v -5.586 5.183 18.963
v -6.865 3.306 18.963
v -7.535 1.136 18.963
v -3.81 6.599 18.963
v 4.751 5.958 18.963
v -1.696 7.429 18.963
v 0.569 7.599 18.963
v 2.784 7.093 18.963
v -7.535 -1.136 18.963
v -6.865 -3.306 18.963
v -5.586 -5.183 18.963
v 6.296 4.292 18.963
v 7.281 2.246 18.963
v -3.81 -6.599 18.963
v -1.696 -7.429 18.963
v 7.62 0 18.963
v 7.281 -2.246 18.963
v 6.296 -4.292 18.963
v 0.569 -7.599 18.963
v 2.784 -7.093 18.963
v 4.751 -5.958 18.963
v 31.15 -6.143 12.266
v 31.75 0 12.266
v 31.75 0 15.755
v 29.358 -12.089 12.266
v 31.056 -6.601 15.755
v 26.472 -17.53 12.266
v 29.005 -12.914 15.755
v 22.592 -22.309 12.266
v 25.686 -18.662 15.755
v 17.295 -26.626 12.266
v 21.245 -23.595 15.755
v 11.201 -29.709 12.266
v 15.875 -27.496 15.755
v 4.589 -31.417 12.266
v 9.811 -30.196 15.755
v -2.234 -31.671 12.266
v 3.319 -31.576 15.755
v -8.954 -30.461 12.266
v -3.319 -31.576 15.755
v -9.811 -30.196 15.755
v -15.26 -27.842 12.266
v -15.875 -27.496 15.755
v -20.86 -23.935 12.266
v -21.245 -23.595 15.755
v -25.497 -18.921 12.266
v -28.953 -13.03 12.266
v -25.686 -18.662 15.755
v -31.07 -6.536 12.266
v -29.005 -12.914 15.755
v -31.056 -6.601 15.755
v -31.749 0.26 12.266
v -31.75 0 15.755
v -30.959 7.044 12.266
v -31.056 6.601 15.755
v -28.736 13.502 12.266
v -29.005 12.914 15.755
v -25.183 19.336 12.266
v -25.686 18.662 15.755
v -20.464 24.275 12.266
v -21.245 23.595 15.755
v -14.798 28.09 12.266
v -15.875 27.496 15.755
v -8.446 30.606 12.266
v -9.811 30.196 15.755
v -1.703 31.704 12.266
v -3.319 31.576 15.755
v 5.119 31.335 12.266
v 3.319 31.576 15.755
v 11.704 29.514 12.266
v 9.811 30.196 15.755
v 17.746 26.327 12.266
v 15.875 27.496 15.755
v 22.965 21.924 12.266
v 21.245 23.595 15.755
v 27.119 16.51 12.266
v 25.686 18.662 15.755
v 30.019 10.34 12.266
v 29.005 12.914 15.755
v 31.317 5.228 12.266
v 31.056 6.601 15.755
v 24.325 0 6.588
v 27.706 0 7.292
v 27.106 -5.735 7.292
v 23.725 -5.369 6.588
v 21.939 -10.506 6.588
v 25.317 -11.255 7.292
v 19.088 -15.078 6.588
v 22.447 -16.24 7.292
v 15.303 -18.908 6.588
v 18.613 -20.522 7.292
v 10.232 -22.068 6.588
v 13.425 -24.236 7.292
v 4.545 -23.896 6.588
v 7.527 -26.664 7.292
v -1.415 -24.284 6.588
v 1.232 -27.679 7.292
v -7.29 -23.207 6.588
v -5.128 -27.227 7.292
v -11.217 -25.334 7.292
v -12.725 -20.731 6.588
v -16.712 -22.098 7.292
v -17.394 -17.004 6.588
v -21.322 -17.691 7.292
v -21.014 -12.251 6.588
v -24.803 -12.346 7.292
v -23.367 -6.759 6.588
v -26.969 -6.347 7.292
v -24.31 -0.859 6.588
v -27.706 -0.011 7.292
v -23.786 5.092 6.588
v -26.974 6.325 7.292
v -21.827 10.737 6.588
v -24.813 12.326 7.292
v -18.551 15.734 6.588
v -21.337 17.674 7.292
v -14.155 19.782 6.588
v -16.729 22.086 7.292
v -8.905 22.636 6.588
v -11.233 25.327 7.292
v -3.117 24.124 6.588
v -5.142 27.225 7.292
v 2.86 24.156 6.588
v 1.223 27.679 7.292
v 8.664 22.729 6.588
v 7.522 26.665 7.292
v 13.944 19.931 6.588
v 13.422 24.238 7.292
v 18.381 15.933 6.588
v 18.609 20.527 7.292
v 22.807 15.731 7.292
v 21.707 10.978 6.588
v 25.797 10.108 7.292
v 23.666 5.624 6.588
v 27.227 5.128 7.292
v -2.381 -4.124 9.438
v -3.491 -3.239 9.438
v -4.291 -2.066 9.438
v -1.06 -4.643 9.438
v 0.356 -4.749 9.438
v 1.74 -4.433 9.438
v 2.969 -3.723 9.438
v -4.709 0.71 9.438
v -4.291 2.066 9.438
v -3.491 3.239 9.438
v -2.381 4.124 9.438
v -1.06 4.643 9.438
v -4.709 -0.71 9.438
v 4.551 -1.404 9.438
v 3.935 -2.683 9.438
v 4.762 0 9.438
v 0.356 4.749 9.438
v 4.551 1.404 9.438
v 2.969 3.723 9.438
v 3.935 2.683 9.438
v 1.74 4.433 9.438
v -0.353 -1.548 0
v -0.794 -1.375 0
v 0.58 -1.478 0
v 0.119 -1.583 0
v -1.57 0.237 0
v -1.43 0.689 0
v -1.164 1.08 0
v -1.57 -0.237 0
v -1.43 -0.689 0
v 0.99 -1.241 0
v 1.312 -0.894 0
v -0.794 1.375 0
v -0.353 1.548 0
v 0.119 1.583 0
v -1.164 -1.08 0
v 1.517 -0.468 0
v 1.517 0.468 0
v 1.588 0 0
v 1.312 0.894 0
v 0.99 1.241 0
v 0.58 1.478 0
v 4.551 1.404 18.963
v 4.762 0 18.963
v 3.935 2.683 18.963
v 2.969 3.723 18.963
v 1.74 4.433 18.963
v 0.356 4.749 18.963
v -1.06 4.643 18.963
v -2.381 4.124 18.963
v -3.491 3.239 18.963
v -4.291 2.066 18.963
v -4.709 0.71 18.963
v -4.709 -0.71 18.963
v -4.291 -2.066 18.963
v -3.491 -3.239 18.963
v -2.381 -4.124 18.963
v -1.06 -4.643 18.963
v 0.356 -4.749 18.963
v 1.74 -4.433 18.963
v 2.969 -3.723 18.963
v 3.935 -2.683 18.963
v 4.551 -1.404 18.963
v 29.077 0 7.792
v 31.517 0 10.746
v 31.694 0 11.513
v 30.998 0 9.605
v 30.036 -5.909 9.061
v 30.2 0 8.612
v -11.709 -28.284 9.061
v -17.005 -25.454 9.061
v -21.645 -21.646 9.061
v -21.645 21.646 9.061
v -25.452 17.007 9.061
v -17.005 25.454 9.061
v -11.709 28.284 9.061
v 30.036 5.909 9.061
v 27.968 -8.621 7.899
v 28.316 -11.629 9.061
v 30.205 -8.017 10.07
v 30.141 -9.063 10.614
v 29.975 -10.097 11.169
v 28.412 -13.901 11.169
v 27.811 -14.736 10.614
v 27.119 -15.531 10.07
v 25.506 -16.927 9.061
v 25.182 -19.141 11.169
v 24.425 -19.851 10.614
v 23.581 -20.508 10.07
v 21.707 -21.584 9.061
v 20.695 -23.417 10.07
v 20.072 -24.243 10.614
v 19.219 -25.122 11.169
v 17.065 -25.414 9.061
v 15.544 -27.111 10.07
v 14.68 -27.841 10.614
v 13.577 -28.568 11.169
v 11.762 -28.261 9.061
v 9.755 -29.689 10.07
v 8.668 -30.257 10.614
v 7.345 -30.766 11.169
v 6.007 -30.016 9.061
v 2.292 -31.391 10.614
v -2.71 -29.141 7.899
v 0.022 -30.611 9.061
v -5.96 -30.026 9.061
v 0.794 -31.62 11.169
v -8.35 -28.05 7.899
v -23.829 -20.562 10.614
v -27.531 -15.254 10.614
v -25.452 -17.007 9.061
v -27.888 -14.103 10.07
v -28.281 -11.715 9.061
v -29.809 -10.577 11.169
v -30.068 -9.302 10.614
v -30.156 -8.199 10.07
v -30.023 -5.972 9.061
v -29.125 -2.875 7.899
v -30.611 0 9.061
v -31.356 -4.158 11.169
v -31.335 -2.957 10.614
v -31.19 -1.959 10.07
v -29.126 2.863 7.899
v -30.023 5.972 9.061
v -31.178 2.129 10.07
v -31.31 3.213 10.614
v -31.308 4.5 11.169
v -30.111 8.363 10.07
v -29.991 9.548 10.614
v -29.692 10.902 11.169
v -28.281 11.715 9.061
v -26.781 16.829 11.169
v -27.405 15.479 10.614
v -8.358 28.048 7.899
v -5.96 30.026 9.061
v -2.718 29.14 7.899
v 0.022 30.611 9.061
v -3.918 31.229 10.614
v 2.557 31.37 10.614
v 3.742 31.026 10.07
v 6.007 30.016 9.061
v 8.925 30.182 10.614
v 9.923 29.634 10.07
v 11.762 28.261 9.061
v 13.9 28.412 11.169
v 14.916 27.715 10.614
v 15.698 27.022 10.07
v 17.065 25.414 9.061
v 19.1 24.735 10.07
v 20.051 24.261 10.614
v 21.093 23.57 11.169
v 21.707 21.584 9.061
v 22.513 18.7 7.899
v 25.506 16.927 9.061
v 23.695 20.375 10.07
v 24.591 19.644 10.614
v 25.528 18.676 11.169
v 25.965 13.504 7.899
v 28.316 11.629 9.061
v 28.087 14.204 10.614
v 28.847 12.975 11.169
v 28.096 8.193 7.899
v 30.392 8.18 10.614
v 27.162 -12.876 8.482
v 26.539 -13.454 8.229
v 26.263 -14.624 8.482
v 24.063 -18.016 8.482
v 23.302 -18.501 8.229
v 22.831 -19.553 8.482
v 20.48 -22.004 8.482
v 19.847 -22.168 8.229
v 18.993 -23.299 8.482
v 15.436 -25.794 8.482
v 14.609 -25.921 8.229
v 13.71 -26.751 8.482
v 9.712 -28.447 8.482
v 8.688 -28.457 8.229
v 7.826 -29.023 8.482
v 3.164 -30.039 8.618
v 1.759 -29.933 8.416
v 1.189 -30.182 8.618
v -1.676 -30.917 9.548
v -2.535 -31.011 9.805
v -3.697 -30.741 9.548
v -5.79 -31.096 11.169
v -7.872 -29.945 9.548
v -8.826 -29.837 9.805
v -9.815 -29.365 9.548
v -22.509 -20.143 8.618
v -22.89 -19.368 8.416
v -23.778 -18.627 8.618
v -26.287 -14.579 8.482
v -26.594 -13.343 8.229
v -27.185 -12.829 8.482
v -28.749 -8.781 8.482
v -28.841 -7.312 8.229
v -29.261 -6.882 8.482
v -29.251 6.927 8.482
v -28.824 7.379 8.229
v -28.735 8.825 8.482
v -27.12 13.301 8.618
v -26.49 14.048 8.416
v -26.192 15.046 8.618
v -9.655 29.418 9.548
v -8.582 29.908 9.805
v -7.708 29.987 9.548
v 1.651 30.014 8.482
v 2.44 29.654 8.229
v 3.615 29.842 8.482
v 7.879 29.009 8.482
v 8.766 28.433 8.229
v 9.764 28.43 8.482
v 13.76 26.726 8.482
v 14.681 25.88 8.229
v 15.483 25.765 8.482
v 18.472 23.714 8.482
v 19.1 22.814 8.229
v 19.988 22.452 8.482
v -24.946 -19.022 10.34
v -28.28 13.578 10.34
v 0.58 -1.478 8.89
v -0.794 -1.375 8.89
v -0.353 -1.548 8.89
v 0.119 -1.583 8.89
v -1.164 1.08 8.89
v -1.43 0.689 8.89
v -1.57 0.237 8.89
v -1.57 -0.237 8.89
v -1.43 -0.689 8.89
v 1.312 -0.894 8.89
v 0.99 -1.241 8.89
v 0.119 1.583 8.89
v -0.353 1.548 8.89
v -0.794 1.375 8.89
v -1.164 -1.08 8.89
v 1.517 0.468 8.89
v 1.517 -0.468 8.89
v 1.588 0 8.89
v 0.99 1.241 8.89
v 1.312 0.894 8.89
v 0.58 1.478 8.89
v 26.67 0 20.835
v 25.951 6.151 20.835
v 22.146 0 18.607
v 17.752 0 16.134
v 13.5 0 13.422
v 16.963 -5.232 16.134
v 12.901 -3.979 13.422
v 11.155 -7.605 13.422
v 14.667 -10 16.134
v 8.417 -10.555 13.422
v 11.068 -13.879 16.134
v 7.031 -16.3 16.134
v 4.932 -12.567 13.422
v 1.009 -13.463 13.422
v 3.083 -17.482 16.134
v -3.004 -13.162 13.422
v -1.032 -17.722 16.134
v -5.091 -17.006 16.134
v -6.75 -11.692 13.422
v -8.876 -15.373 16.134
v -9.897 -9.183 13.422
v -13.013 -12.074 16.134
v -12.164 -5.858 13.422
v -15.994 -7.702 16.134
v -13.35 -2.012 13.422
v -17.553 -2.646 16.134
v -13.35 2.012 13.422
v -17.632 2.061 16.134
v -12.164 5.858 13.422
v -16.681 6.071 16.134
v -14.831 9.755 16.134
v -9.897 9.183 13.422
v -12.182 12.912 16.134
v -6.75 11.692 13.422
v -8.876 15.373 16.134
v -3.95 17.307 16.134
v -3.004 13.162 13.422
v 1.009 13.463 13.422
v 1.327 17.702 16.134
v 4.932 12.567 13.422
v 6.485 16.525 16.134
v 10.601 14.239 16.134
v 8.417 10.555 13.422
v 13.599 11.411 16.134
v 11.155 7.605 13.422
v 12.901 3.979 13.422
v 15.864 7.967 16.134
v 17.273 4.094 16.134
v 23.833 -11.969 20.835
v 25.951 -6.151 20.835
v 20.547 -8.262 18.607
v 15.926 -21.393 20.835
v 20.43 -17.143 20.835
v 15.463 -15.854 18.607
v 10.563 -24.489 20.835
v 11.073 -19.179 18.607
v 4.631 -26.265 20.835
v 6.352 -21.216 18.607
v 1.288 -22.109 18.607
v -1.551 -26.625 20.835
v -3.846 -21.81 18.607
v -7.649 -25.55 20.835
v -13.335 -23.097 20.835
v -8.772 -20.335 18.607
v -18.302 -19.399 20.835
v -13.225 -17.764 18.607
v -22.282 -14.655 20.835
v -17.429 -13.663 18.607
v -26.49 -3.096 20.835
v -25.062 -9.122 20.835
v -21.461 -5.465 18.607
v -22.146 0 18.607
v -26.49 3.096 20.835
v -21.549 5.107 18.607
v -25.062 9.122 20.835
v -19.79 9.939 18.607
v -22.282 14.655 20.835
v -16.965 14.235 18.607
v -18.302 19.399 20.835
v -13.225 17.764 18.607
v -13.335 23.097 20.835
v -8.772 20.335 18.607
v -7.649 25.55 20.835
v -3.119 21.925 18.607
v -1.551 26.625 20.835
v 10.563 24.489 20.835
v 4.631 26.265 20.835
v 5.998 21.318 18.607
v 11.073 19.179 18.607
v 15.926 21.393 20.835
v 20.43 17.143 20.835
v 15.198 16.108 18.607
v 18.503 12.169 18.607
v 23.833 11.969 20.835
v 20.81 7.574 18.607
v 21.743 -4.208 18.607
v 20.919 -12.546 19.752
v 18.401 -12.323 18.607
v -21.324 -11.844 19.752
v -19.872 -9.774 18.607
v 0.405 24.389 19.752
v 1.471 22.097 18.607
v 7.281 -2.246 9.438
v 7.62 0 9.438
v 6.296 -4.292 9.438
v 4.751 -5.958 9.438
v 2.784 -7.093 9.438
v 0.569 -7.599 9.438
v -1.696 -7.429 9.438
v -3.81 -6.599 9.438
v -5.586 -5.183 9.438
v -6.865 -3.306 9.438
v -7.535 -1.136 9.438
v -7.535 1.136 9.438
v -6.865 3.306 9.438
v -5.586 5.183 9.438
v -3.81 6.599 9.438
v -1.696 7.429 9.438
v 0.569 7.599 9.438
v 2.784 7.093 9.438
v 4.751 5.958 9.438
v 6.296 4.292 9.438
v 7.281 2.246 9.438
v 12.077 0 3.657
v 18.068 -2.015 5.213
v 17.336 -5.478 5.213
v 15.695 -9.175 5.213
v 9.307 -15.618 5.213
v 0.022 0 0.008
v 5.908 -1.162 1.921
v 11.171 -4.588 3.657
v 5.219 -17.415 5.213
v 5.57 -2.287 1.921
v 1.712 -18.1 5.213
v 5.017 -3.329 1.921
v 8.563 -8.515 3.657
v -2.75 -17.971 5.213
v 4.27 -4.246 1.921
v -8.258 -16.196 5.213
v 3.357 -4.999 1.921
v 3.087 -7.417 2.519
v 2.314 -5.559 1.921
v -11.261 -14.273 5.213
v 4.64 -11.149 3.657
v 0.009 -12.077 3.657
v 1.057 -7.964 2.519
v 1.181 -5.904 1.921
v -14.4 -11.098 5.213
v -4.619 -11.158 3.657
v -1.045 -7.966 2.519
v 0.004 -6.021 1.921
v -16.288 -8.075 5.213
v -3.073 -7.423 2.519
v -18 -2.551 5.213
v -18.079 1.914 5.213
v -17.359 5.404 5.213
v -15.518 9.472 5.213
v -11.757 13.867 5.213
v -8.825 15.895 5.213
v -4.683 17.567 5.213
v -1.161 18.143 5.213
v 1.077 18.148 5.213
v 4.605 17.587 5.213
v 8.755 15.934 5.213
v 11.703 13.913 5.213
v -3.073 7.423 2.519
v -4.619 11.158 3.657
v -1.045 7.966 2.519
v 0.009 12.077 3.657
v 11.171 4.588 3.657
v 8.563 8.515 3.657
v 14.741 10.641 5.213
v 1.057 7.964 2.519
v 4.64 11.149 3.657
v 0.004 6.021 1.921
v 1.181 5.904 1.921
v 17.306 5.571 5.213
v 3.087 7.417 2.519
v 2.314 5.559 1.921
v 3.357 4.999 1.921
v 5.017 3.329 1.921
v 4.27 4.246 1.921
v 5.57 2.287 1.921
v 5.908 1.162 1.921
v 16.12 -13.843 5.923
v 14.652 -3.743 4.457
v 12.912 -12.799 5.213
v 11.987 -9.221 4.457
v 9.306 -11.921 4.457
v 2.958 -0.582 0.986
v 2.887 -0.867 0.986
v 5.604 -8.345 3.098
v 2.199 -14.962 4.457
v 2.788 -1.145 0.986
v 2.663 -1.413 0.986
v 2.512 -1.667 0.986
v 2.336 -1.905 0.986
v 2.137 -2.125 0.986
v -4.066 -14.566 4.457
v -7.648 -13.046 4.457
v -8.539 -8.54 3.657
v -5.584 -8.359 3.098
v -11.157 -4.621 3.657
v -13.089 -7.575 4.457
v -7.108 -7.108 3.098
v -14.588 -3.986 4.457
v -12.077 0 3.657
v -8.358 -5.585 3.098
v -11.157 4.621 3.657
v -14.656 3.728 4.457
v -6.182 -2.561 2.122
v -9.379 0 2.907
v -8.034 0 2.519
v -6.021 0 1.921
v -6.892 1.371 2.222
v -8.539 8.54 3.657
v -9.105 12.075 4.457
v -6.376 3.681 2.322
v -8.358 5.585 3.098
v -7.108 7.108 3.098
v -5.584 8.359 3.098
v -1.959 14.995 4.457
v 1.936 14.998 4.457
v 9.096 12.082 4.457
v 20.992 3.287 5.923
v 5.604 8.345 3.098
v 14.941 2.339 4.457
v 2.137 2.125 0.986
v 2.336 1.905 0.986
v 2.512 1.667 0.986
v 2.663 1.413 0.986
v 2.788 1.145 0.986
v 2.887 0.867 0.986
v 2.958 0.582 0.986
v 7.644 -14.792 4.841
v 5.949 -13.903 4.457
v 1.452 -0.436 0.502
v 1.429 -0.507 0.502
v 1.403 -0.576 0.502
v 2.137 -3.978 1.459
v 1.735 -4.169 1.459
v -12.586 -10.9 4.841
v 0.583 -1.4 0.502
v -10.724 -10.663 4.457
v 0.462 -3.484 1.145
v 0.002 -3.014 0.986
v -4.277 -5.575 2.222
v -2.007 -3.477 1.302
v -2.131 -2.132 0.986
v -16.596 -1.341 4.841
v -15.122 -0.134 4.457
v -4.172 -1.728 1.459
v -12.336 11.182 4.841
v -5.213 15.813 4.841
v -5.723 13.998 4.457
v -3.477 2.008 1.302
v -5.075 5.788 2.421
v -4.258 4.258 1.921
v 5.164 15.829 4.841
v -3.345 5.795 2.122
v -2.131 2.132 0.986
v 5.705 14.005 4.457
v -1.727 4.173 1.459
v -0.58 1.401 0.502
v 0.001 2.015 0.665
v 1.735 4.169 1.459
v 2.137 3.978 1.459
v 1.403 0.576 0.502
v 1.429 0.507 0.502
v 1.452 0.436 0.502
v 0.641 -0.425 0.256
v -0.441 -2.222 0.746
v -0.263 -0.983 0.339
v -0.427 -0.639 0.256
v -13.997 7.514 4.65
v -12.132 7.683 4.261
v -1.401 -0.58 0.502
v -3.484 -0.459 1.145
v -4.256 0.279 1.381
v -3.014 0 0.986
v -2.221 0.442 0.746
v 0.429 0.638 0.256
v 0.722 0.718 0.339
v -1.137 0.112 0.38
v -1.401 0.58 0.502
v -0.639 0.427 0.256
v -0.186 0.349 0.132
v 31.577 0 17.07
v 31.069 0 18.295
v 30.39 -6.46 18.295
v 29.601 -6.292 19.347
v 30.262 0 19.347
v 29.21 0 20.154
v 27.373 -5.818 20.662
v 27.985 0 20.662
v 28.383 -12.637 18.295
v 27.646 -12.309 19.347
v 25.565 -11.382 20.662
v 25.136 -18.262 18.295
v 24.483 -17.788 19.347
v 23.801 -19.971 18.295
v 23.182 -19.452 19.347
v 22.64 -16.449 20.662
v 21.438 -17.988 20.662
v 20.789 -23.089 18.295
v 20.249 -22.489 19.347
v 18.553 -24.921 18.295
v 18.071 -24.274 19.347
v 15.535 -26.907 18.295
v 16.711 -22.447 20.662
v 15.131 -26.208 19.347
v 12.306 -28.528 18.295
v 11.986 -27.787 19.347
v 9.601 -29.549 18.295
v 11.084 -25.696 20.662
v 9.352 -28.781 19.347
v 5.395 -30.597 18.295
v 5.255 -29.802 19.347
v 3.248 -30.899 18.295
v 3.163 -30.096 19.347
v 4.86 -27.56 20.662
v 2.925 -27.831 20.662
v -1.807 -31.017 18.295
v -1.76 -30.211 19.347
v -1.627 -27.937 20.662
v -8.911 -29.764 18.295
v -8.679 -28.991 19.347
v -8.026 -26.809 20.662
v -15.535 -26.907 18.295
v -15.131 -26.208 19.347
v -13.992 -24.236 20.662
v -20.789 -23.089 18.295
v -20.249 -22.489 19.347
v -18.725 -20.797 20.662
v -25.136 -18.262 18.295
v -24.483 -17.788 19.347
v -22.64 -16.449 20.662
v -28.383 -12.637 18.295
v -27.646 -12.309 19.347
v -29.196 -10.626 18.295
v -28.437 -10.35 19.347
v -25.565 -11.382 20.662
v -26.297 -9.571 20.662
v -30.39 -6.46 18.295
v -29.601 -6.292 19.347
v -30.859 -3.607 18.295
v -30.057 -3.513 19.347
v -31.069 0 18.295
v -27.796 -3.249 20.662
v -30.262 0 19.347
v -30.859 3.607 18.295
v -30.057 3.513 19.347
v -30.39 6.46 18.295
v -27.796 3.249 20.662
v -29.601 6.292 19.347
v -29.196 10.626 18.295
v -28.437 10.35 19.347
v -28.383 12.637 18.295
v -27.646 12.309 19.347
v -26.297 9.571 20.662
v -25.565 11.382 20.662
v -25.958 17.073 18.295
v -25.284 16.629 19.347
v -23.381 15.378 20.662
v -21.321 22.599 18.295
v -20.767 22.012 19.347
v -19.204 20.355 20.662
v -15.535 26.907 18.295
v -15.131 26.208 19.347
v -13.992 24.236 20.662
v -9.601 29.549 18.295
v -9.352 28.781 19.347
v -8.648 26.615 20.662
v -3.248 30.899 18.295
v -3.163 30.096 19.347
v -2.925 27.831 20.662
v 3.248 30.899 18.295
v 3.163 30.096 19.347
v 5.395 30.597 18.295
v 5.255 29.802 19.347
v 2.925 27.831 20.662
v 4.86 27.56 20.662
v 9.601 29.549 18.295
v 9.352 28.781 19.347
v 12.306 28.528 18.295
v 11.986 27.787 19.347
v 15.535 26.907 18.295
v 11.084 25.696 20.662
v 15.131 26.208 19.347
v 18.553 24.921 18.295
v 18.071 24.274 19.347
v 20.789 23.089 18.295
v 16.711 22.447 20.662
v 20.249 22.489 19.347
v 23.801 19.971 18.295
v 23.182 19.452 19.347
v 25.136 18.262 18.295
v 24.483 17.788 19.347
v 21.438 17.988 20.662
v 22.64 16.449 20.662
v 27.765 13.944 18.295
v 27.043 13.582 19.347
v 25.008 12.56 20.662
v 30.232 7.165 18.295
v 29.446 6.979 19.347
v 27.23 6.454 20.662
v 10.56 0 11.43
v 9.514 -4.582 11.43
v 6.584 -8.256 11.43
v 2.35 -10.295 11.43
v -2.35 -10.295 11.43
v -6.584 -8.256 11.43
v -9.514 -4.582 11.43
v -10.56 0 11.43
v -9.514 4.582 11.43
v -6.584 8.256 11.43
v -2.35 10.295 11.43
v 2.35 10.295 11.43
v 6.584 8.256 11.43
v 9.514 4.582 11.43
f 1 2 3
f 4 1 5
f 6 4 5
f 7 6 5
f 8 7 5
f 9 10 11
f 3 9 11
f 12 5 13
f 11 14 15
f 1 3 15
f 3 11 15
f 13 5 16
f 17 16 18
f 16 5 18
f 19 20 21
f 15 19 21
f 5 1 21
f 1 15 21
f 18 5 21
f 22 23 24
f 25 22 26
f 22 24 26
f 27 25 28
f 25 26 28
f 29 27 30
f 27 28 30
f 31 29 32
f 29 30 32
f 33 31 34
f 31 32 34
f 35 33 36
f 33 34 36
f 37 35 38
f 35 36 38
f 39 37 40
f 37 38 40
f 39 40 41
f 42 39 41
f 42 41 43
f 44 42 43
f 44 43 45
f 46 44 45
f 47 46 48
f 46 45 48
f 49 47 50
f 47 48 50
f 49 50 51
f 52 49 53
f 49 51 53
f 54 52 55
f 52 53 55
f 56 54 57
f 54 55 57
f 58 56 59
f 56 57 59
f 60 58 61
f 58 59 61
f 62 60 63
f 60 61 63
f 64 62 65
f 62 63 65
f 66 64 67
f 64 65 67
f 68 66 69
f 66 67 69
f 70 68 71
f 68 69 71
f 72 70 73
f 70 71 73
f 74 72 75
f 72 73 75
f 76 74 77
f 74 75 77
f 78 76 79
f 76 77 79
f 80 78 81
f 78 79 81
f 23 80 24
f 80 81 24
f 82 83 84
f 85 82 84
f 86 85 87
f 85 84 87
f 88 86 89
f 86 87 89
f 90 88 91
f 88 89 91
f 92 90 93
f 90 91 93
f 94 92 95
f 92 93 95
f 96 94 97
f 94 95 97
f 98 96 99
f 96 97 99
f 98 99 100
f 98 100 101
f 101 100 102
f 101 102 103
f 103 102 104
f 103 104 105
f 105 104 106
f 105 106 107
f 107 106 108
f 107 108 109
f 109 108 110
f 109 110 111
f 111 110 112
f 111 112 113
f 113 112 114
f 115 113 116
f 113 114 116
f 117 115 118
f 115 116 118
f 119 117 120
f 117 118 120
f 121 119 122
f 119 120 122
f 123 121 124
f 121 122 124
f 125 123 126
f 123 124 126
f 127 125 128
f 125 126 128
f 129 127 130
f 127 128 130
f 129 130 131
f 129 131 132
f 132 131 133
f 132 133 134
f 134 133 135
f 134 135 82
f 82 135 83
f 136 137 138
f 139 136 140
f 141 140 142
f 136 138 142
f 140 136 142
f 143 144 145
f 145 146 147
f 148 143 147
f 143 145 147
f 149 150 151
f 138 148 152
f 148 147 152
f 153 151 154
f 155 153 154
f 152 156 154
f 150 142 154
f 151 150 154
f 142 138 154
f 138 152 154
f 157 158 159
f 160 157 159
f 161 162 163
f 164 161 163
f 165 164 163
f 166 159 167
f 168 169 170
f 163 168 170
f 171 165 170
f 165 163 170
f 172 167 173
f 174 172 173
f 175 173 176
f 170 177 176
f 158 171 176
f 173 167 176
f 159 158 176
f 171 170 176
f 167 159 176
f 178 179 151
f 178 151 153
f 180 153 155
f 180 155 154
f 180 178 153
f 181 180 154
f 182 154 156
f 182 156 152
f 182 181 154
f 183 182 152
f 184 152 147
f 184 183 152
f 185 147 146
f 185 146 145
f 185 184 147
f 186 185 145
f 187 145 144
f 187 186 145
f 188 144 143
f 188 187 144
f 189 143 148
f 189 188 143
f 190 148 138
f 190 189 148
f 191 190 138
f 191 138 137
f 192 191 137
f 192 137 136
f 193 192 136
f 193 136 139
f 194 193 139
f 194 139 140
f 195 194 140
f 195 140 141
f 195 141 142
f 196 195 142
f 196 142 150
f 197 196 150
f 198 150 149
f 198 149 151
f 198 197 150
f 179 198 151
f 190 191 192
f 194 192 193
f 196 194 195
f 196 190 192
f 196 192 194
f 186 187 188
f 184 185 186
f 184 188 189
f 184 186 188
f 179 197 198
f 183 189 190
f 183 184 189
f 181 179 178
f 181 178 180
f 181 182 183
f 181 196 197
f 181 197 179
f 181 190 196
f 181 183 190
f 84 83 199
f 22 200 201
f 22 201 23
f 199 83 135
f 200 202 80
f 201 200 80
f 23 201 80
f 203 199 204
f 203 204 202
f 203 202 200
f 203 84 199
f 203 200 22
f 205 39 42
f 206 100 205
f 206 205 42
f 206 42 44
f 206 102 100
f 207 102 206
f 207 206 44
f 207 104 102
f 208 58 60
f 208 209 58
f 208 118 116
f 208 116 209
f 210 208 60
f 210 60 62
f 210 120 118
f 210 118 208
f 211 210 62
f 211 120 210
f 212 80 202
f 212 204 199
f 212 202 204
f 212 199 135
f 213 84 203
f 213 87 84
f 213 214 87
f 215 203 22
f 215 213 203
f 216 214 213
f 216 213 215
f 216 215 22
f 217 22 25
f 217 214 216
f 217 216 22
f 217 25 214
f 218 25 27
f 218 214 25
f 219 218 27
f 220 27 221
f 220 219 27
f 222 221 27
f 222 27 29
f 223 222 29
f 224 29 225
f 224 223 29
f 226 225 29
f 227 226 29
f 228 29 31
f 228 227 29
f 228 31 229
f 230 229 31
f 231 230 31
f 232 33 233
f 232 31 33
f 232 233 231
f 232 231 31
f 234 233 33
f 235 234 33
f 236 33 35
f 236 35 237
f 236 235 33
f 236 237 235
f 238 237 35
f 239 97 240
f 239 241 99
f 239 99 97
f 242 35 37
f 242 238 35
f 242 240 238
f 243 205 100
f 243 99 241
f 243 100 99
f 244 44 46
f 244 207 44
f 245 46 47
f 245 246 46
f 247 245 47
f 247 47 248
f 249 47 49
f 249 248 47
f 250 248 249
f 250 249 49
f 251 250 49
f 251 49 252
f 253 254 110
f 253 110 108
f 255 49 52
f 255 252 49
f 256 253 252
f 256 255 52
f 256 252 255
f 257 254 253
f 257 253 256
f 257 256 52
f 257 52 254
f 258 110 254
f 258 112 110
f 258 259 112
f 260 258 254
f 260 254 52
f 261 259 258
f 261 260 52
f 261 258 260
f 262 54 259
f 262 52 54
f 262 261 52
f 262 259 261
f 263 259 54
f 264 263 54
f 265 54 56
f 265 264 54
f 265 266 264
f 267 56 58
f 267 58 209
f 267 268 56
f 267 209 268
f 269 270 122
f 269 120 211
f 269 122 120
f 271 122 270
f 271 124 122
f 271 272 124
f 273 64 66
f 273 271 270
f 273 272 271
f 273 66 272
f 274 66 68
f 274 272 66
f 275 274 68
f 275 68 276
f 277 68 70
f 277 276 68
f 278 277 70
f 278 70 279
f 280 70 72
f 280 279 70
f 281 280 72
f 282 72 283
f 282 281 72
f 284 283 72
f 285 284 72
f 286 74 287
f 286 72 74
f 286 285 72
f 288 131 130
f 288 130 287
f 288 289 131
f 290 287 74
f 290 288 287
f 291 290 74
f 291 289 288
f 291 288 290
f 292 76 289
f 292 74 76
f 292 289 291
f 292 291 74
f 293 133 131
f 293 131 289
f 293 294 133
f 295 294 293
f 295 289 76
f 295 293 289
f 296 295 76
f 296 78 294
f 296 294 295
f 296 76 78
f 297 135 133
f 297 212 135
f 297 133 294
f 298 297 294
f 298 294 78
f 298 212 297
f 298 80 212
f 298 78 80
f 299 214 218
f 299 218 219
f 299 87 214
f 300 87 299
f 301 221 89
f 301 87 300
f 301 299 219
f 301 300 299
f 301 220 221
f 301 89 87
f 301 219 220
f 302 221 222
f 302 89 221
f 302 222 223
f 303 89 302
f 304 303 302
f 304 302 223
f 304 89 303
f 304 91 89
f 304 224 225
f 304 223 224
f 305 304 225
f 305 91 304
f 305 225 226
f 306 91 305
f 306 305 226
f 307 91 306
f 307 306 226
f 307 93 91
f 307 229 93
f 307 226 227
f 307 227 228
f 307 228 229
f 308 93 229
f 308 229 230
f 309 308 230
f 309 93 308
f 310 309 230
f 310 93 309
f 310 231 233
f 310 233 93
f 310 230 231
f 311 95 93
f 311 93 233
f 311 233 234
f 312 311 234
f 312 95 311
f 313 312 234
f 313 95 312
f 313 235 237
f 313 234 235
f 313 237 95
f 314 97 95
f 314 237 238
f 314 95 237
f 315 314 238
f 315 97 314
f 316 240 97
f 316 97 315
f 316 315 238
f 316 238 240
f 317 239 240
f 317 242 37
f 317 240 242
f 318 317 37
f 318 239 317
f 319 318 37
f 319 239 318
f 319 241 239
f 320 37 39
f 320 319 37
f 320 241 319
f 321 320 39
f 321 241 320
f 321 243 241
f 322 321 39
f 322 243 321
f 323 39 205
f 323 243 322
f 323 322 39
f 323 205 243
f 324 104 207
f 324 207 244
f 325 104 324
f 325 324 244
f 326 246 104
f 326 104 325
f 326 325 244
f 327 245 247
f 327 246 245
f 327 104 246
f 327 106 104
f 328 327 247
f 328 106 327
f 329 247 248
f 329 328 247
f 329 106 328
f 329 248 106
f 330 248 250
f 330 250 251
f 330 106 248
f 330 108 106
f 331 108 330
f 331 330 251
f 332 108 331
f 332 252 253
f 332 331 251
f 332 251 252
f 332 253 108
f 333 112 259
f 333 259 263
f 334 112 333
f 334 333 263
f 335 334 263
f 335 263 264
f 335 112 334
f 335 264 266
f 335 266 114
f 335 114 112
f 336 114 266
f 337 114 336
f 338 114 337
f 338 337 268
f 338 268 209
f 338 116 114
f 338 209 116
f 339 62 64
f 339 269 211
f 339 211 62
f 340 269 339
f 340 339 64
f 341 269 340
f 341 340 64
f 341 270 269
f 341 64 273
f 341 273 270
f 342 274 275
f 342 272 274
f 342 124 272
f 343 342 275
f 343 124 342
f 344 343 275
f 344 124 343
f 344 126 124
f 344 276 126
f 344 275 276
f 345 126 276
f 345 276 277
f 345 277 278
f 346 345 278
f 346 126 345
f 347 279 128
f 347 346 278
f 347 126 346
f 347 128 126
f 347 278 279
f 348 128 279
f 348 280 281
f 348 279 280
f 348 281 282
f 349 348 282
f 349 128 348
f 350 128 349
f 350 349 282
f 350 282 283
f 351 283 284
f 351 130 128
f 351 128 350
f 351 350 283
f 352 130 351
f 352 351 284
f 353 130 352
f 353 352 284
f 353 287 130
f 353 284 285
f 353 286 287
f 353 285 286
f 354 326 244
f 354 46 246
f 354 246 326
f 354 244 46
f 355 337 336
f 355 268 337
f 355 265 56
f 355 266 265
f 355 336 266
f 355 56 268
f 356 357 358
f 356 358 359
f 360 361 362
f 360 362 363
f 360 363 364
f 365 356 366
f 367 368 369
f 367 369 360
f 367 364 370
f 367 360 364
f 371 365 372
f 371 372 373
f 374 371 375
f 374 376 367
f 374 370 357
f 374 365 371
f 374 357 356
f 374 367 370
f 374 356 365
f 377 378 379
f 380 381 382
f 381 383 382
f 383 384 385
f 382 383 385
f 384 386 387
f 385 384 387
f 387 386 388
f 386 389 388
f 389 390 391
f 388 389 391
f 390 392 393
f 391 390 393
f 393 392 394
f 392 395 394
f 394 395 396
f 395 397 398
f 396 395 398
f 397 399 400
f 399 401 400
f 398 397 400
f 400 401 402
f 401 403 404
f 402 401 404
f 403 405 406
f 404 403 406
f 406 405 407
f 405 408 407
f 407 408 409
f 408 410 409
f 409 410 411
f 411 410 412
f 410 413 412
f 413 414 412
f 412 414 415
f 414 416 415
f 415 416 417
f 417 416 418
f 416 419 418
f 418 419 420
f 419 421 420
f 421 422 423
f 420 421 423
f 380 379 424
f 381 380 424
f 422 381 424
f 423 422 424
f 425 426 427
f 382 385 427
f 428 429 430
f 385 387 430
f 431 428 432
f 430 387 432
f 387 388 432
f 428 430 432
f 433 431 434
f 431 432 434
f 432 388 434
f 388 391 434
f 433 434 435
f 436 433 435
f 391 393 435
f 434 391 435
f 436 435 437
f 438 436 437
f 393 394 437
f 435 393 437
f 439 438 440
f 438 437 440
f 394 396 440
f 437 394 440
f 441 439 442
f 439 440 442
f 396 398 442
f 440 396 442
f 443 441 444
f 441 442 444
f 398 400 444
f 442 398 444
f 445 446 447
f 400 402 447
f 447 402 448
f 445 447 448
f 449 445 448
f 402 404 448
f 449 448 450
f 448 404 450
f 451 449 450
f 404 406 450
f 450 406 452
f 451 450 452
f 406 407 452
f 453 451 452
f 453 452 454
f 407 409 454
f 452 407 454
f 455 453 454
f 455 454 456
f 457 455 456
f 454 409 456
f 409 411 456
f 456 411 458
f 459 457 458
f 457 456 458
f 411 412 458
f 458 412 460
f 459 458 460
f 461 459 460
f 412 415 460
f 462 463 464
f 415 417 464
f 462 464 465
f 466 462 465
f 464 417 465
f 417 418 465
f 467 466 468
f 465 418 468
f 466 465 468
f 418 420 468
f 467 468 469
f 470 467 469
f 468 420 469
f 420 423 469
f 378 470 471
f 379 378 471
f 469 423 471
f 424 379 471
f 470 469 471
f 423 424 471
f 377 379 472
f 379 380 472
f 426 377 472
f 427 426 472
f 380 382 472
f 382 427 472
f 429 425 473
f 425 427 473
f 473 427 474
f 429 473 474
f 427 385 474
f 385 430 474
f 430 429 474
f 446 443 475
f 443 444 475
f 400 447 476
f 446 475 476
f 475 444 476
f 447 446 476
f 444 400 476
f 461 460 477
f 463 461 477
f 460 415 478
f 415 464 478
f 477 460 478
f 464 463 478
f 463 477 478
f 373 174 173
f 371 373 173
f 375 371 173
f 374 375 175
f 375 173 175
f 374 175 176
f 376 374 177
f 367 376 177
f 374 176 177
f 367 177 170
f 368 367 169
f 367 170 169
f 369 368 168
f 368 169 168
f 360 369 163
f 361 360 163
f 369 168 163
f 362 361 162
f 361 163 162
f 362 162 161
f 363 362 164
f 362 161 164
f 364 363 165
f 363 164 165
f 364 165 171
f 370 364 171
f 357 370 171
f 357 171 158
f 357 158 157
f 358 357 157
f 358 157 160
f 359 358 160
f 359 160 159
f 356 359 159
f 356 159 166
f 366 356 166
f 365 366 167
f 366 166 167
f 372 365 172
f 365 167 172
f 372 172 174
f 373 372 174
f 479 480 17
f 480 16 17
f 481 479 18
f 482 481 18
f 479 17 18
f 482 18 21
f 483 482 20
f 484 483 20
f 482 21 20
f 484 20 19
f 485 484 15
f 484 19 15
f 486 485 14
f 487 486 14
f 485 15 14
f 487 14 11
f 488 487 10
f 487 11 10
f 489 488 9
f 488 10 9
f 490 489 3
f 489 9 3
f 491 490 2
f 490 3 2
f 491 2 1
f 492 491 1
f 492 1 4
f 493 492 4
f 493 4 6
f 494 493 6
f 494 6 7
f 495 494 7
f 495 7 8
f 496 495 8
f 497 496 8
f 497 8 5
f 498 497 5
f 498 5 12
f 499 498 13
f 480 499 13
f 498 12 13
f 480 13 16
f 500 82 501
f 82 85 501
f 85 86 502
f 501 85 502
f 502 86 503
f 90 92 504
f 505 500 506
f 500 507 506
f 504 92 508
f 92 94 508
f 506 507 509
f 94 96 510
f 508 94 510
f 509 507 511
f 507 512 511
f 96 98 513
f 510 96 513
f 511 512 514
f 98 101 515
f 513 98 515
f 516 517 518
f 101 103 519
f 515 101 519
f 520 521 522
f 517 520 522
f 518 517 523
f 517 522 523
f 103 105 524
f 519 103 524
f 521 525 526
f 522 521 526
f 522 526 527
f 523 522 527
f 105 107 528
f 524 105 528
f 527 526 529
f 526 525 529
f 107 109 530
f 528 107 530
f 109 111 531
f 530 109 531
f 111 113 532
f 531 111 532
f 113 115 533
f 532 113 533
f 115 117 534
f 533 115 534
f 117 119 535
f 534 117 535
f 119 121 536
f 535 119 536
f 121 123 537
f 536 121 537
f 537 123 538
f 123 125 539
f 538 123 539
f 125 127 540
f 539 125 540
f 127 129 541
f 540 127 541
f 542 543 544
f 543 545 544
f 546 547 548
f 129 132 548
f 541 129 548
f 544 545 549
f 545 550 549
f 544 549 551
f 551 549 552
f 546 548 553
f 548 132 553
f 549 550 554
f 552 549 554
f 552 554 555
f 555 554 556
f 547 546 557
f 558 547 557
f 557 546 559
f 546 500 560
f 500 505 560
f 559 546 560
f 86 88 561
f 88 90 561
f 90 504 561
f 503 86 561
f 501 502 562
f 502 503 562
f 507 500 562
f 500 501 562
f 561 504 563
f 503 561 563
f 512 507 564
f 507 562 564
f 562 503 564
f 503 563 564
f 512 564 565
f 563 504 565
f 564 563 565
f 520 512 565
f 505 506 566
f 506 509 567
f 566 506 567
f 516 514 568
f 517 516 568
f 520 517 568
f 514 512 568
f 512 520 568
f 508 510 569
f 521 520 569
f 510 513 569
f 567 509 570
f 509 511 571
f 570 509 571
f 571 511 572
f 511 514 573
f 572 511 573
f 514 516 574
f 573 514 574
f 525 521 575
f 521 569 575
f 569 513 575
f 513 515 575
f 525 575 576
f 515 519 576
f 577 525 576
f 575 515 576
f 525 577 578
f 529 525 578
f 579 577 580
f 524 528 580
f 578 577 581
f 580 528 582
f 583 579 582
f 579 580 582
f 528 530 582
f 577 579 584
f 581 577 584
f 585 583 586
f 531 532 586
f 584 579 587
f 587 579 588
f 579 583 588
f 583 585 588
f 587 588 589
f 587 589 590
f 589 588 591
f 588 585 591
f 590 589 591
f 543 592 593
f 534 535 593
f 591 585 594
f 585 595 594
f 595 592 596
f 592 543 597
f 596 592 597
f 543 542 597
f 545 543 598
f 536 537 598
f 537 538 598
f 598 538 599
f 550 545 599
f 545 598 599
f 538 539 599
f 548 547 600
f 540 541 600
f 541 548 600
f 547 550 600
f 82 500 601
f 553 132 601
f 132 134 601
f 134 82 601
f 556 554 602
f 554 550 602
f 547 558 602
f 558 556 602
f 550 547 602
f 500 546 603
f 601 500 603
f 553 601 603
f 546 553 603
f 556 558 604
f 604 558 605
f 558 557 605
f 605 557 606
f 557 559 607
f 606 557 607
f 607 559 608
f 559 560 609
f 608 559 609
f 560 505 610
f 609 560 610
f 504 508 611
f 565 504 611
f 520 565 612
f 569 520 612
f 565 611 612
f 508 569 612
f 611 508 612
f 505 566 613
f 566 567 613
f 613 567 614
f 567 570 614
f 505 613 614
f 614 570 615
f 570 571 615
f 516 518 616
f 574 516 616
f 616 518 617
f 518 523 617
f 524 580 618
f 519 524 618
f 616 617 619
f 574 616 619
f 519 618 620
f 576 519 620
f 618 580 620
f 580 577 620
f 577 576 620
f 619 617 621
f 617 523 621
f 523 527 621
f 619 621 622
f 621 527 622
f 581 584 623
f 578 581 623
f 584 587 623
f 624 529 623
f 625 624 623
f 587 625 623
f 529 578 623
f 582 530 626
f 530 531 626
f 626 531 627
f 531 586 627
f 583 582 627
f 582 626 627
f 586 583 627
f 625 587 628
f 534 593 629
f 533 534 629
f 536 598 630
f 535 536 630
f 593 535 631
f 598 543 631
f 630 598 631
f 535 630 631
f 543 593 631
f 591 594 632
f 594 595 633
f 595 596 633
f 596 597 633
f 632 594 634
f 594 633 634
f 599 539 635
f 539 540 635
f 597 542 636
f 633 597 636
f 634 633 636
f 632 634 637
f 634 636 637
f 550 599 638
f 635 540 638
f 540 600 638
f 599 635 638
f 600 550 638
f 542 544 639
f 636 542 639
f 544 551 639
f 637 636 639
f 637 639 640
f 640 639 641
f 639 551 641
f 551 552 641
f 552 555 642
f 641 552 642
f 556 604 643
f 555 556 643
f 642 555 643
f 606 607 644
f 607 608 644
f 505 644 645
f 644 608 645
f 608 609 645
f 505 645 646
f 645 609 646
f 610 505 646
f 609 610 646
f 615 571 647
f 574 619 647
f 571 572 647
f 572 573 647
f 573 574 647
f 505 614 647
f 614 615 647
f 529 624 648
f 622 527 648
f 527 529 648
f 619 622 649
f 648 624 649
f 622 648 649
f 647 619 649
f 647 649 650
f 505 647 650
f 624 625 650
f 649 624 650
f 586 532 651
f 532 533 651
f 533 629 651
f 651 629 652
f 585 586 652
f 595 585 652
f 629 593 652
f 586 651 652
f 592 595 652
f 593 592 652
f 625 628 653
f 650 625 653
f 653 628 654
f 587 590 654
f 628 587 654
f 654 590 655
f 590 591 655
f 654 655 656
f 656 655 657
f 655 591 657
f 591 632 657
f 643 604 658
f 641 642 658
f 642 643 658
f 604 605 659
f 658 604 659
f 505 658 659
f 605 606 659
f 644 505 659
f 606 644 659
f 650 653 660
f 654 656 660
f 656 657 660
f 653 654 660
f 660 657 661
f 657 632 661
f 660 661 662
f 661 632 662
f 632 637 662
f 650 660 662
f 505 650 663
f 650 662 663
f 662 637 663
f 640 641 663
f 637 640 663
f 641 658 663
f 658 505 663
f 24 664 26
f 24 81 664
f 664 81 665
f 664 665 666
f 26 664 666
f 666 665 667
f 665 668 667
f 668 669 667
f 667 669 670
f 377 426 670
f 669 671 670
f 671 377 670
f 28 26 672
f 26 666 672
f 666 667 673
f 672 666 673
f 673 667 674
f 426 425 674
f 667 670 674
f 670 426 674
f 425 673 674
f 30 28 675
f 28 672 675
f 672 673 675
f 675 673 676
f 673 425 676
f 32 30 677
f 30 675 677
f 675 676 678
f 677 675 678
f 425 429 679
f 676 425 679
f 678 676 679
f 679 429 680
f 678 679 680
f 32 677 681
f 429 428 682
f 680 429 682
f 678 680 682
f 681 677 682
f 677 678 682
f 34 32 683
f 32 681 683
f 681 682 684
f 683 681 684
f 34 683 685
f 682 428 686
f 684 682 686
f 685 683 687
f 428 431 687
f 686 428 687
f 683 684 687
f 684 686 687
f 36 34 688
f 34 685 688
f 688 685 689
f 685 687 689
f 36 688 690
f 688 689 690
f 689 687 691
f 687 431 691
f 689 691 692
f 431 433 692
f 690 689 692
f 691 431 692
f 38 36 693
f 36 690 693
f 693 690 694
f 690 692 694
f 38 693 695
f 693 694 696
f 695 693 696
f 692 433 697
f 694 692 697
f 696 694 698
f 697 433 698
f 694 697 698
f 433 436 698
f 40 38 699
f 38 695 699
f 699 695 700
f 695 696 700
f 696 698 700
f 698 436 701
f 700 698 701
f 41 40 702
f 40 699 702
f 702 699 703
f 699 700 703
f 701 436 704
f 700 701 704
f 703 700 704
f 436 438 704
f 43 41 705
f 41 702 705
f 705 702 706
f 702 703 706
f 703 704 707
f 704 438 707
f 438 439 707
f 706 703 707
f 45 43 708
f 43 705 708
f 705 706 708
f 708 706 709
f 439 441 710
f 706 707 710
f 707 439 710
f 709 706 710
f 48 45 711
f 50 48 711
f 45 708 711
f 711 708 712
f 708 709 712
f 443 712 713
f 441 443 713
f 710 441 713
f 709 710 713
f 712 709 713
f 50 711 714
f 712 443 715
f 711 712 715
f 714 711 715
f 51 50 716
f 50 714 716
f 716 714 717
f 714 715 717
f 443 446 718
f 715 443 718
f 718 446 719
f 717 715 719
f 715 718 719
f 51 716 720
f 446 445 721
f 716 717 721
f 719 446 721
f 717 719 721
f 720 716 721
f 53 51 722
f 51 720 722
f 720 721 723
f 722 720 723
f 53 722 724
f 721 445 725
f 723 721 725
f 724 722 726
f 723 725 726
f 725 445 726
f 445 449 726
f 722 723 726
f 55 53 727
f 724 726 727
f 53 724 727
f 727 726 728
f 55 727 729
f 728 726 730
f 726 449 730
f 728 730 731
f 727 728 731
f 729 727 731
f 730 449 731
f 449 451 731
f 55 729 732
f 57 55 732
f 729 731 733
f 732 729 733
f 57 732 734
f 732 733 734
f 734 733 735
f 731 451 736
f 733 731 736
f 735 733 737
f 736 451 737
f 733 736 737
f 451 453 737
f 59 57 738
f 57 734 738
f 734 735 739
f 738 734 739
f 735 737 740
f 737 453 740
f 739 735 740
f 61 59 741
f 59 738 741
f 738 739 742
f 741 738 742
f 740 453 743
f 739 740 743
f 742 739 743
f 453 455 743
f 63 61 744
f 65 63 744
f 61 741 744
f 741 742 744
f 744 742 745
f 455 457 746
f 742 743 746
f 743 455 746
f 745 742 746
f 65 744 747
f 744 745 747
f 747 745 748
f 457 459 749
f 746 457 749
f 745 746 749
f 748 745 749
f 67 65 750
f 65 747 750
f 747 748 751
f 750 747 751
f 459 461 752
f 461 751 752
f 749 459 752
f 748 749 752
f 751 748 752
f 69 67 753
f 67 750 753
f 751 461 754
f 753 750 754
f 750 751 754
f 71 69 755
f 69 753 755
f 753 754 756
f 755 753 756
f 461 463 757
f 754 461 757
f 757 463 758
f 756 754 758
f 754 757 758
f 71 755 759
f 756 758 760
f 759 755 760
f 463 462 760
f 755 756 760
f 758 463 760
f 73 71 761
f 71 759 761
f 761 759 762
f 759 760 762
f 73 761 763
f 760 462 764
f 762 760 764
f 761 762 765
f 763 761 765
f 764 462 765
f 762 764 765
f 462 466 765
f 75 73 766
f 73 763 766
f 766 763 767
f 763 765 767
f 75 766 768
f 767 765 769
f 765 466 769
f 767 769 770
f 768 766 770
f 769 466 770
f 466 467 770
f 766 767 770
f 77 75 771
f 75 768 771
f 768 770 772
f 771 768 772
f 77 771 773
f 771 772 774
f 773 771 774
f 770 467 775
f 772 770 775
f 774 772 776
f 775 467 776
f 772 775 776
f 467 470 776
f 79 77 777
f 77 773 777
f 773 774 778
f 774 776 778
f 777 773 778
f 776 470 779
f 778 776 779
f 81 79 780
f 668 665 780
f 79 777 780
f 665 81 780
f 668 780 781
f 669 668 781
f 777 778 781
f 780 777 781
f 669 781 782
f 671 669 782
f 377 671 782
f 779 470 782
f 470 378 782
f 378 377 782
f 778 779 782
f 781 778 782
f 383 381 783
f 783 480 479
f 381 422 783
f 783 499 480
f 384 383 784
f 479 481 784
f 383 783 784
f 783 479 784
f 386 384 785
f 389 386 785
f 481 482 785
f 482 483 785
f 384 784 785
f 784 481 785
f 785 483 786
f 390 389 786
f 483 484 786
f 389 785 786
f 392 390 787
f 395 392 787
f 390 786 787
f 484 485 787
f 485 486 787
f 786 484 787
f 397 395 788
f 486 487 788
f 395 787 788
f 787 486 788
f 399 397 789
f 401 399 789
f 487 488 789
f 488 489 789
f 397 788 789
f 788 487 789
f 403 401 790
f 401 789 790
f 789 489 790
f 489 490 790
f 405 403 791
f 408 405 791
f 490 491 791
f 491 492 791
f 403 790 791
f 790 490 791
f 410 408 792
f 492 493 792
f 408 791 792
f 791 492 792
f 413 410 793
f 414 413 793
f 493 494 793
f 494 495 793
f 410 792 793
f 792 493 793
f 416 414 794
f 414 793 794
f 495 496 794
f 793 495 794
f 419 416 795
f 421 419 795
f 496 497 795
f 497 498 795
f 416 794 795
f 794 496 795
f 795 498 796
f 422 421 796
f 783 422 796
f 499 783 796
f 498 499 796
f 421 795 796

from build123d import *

# Parameters (mm, degrees)
F2_R     = 5.08
F4_R     = 213.36
F5_R     = 4.7625
F6_DEPTH = 9.525
F7_R     = 1.5875
F8_DEPTH = 8.89


# Not quite as in the source:
# - a fillet or chamfer that OpenCascade refuses, or shapes differently, is made with other operations: its cross-section is extruded or revolved along the edge and cut away or added


with BuildPart() as f1:
    # F0 (on Front) → F1 (revolve)
    with BuildSketch(Plane.XZ):
        Polygon((11.9791877568, 4.0159458295), (31.75, 8.134865202), (31.75, 20.834865202), (24.4433090497, 20.834865202), (7.62, 9.4384327507), (7.62, 18.9634327507), (0, 18.9634327507), (0, 0), align=None)
    revolve(axis=Axis((0, 0, 9.4817163754), (0, 0, -1)))

    # F2
    f2_edges = [f1.edges().sort_by_distance(p)[0] for p in [
        (-31.75, 0, 8.134865),
        (-31.75, 0, 20.834865),
        (31.75, 0, 14.484865),
    ]]
    fillet(f2_edges, radius=F2_R)

    # F3: fillet of radius 91.44 on 2 edges, made by hand

    # F3_s1 → F3_t2 (revolve, cut)
    with BuildSketch(Plane.XZ):
        with BuildLine():
            ThreePointArc((26.67, 20.834865202), (19.9318360713, 17.4009600318), (13.5004823618, 13.4219843706))
            Line((13.5004823618, 13.4219843706), (24.4433090497, 20.834865202))
            Line((24.4433090497, 20.834865202), (26.67, 20.834865202))
        make_face()
    revolve(axis=Axis((0, 0, 20.834865202), (0, 0, -1)), mode=Mode.SUBTRACT)

    # F4
    f4_edges = [f1.edges().sort_by_distance(p)[0] for p in [
        (-11.979188, 0, 4.015946),
        (-27.706088, 0, 7.292383),
    ]]
    fillet(f4_edges, radius=F4_R)


with BuildPart() as f6:
    # F5 (on face) → F6 (new body)
    with BuildSketch(Plane.XY.offset(18.9634327507)):
        Circle(F5_R)
    extrude(amount=-F6_DEPTH)


with BuildPart() as f8:
    # F7 (on Top) → F8 (new body)
    with BuildSketch(Plane.XY):
        Circle(F7_R)
    extrude(amount=F8_DEPTH)


solid = Compound([f1.part, f6.part, f8.part])
